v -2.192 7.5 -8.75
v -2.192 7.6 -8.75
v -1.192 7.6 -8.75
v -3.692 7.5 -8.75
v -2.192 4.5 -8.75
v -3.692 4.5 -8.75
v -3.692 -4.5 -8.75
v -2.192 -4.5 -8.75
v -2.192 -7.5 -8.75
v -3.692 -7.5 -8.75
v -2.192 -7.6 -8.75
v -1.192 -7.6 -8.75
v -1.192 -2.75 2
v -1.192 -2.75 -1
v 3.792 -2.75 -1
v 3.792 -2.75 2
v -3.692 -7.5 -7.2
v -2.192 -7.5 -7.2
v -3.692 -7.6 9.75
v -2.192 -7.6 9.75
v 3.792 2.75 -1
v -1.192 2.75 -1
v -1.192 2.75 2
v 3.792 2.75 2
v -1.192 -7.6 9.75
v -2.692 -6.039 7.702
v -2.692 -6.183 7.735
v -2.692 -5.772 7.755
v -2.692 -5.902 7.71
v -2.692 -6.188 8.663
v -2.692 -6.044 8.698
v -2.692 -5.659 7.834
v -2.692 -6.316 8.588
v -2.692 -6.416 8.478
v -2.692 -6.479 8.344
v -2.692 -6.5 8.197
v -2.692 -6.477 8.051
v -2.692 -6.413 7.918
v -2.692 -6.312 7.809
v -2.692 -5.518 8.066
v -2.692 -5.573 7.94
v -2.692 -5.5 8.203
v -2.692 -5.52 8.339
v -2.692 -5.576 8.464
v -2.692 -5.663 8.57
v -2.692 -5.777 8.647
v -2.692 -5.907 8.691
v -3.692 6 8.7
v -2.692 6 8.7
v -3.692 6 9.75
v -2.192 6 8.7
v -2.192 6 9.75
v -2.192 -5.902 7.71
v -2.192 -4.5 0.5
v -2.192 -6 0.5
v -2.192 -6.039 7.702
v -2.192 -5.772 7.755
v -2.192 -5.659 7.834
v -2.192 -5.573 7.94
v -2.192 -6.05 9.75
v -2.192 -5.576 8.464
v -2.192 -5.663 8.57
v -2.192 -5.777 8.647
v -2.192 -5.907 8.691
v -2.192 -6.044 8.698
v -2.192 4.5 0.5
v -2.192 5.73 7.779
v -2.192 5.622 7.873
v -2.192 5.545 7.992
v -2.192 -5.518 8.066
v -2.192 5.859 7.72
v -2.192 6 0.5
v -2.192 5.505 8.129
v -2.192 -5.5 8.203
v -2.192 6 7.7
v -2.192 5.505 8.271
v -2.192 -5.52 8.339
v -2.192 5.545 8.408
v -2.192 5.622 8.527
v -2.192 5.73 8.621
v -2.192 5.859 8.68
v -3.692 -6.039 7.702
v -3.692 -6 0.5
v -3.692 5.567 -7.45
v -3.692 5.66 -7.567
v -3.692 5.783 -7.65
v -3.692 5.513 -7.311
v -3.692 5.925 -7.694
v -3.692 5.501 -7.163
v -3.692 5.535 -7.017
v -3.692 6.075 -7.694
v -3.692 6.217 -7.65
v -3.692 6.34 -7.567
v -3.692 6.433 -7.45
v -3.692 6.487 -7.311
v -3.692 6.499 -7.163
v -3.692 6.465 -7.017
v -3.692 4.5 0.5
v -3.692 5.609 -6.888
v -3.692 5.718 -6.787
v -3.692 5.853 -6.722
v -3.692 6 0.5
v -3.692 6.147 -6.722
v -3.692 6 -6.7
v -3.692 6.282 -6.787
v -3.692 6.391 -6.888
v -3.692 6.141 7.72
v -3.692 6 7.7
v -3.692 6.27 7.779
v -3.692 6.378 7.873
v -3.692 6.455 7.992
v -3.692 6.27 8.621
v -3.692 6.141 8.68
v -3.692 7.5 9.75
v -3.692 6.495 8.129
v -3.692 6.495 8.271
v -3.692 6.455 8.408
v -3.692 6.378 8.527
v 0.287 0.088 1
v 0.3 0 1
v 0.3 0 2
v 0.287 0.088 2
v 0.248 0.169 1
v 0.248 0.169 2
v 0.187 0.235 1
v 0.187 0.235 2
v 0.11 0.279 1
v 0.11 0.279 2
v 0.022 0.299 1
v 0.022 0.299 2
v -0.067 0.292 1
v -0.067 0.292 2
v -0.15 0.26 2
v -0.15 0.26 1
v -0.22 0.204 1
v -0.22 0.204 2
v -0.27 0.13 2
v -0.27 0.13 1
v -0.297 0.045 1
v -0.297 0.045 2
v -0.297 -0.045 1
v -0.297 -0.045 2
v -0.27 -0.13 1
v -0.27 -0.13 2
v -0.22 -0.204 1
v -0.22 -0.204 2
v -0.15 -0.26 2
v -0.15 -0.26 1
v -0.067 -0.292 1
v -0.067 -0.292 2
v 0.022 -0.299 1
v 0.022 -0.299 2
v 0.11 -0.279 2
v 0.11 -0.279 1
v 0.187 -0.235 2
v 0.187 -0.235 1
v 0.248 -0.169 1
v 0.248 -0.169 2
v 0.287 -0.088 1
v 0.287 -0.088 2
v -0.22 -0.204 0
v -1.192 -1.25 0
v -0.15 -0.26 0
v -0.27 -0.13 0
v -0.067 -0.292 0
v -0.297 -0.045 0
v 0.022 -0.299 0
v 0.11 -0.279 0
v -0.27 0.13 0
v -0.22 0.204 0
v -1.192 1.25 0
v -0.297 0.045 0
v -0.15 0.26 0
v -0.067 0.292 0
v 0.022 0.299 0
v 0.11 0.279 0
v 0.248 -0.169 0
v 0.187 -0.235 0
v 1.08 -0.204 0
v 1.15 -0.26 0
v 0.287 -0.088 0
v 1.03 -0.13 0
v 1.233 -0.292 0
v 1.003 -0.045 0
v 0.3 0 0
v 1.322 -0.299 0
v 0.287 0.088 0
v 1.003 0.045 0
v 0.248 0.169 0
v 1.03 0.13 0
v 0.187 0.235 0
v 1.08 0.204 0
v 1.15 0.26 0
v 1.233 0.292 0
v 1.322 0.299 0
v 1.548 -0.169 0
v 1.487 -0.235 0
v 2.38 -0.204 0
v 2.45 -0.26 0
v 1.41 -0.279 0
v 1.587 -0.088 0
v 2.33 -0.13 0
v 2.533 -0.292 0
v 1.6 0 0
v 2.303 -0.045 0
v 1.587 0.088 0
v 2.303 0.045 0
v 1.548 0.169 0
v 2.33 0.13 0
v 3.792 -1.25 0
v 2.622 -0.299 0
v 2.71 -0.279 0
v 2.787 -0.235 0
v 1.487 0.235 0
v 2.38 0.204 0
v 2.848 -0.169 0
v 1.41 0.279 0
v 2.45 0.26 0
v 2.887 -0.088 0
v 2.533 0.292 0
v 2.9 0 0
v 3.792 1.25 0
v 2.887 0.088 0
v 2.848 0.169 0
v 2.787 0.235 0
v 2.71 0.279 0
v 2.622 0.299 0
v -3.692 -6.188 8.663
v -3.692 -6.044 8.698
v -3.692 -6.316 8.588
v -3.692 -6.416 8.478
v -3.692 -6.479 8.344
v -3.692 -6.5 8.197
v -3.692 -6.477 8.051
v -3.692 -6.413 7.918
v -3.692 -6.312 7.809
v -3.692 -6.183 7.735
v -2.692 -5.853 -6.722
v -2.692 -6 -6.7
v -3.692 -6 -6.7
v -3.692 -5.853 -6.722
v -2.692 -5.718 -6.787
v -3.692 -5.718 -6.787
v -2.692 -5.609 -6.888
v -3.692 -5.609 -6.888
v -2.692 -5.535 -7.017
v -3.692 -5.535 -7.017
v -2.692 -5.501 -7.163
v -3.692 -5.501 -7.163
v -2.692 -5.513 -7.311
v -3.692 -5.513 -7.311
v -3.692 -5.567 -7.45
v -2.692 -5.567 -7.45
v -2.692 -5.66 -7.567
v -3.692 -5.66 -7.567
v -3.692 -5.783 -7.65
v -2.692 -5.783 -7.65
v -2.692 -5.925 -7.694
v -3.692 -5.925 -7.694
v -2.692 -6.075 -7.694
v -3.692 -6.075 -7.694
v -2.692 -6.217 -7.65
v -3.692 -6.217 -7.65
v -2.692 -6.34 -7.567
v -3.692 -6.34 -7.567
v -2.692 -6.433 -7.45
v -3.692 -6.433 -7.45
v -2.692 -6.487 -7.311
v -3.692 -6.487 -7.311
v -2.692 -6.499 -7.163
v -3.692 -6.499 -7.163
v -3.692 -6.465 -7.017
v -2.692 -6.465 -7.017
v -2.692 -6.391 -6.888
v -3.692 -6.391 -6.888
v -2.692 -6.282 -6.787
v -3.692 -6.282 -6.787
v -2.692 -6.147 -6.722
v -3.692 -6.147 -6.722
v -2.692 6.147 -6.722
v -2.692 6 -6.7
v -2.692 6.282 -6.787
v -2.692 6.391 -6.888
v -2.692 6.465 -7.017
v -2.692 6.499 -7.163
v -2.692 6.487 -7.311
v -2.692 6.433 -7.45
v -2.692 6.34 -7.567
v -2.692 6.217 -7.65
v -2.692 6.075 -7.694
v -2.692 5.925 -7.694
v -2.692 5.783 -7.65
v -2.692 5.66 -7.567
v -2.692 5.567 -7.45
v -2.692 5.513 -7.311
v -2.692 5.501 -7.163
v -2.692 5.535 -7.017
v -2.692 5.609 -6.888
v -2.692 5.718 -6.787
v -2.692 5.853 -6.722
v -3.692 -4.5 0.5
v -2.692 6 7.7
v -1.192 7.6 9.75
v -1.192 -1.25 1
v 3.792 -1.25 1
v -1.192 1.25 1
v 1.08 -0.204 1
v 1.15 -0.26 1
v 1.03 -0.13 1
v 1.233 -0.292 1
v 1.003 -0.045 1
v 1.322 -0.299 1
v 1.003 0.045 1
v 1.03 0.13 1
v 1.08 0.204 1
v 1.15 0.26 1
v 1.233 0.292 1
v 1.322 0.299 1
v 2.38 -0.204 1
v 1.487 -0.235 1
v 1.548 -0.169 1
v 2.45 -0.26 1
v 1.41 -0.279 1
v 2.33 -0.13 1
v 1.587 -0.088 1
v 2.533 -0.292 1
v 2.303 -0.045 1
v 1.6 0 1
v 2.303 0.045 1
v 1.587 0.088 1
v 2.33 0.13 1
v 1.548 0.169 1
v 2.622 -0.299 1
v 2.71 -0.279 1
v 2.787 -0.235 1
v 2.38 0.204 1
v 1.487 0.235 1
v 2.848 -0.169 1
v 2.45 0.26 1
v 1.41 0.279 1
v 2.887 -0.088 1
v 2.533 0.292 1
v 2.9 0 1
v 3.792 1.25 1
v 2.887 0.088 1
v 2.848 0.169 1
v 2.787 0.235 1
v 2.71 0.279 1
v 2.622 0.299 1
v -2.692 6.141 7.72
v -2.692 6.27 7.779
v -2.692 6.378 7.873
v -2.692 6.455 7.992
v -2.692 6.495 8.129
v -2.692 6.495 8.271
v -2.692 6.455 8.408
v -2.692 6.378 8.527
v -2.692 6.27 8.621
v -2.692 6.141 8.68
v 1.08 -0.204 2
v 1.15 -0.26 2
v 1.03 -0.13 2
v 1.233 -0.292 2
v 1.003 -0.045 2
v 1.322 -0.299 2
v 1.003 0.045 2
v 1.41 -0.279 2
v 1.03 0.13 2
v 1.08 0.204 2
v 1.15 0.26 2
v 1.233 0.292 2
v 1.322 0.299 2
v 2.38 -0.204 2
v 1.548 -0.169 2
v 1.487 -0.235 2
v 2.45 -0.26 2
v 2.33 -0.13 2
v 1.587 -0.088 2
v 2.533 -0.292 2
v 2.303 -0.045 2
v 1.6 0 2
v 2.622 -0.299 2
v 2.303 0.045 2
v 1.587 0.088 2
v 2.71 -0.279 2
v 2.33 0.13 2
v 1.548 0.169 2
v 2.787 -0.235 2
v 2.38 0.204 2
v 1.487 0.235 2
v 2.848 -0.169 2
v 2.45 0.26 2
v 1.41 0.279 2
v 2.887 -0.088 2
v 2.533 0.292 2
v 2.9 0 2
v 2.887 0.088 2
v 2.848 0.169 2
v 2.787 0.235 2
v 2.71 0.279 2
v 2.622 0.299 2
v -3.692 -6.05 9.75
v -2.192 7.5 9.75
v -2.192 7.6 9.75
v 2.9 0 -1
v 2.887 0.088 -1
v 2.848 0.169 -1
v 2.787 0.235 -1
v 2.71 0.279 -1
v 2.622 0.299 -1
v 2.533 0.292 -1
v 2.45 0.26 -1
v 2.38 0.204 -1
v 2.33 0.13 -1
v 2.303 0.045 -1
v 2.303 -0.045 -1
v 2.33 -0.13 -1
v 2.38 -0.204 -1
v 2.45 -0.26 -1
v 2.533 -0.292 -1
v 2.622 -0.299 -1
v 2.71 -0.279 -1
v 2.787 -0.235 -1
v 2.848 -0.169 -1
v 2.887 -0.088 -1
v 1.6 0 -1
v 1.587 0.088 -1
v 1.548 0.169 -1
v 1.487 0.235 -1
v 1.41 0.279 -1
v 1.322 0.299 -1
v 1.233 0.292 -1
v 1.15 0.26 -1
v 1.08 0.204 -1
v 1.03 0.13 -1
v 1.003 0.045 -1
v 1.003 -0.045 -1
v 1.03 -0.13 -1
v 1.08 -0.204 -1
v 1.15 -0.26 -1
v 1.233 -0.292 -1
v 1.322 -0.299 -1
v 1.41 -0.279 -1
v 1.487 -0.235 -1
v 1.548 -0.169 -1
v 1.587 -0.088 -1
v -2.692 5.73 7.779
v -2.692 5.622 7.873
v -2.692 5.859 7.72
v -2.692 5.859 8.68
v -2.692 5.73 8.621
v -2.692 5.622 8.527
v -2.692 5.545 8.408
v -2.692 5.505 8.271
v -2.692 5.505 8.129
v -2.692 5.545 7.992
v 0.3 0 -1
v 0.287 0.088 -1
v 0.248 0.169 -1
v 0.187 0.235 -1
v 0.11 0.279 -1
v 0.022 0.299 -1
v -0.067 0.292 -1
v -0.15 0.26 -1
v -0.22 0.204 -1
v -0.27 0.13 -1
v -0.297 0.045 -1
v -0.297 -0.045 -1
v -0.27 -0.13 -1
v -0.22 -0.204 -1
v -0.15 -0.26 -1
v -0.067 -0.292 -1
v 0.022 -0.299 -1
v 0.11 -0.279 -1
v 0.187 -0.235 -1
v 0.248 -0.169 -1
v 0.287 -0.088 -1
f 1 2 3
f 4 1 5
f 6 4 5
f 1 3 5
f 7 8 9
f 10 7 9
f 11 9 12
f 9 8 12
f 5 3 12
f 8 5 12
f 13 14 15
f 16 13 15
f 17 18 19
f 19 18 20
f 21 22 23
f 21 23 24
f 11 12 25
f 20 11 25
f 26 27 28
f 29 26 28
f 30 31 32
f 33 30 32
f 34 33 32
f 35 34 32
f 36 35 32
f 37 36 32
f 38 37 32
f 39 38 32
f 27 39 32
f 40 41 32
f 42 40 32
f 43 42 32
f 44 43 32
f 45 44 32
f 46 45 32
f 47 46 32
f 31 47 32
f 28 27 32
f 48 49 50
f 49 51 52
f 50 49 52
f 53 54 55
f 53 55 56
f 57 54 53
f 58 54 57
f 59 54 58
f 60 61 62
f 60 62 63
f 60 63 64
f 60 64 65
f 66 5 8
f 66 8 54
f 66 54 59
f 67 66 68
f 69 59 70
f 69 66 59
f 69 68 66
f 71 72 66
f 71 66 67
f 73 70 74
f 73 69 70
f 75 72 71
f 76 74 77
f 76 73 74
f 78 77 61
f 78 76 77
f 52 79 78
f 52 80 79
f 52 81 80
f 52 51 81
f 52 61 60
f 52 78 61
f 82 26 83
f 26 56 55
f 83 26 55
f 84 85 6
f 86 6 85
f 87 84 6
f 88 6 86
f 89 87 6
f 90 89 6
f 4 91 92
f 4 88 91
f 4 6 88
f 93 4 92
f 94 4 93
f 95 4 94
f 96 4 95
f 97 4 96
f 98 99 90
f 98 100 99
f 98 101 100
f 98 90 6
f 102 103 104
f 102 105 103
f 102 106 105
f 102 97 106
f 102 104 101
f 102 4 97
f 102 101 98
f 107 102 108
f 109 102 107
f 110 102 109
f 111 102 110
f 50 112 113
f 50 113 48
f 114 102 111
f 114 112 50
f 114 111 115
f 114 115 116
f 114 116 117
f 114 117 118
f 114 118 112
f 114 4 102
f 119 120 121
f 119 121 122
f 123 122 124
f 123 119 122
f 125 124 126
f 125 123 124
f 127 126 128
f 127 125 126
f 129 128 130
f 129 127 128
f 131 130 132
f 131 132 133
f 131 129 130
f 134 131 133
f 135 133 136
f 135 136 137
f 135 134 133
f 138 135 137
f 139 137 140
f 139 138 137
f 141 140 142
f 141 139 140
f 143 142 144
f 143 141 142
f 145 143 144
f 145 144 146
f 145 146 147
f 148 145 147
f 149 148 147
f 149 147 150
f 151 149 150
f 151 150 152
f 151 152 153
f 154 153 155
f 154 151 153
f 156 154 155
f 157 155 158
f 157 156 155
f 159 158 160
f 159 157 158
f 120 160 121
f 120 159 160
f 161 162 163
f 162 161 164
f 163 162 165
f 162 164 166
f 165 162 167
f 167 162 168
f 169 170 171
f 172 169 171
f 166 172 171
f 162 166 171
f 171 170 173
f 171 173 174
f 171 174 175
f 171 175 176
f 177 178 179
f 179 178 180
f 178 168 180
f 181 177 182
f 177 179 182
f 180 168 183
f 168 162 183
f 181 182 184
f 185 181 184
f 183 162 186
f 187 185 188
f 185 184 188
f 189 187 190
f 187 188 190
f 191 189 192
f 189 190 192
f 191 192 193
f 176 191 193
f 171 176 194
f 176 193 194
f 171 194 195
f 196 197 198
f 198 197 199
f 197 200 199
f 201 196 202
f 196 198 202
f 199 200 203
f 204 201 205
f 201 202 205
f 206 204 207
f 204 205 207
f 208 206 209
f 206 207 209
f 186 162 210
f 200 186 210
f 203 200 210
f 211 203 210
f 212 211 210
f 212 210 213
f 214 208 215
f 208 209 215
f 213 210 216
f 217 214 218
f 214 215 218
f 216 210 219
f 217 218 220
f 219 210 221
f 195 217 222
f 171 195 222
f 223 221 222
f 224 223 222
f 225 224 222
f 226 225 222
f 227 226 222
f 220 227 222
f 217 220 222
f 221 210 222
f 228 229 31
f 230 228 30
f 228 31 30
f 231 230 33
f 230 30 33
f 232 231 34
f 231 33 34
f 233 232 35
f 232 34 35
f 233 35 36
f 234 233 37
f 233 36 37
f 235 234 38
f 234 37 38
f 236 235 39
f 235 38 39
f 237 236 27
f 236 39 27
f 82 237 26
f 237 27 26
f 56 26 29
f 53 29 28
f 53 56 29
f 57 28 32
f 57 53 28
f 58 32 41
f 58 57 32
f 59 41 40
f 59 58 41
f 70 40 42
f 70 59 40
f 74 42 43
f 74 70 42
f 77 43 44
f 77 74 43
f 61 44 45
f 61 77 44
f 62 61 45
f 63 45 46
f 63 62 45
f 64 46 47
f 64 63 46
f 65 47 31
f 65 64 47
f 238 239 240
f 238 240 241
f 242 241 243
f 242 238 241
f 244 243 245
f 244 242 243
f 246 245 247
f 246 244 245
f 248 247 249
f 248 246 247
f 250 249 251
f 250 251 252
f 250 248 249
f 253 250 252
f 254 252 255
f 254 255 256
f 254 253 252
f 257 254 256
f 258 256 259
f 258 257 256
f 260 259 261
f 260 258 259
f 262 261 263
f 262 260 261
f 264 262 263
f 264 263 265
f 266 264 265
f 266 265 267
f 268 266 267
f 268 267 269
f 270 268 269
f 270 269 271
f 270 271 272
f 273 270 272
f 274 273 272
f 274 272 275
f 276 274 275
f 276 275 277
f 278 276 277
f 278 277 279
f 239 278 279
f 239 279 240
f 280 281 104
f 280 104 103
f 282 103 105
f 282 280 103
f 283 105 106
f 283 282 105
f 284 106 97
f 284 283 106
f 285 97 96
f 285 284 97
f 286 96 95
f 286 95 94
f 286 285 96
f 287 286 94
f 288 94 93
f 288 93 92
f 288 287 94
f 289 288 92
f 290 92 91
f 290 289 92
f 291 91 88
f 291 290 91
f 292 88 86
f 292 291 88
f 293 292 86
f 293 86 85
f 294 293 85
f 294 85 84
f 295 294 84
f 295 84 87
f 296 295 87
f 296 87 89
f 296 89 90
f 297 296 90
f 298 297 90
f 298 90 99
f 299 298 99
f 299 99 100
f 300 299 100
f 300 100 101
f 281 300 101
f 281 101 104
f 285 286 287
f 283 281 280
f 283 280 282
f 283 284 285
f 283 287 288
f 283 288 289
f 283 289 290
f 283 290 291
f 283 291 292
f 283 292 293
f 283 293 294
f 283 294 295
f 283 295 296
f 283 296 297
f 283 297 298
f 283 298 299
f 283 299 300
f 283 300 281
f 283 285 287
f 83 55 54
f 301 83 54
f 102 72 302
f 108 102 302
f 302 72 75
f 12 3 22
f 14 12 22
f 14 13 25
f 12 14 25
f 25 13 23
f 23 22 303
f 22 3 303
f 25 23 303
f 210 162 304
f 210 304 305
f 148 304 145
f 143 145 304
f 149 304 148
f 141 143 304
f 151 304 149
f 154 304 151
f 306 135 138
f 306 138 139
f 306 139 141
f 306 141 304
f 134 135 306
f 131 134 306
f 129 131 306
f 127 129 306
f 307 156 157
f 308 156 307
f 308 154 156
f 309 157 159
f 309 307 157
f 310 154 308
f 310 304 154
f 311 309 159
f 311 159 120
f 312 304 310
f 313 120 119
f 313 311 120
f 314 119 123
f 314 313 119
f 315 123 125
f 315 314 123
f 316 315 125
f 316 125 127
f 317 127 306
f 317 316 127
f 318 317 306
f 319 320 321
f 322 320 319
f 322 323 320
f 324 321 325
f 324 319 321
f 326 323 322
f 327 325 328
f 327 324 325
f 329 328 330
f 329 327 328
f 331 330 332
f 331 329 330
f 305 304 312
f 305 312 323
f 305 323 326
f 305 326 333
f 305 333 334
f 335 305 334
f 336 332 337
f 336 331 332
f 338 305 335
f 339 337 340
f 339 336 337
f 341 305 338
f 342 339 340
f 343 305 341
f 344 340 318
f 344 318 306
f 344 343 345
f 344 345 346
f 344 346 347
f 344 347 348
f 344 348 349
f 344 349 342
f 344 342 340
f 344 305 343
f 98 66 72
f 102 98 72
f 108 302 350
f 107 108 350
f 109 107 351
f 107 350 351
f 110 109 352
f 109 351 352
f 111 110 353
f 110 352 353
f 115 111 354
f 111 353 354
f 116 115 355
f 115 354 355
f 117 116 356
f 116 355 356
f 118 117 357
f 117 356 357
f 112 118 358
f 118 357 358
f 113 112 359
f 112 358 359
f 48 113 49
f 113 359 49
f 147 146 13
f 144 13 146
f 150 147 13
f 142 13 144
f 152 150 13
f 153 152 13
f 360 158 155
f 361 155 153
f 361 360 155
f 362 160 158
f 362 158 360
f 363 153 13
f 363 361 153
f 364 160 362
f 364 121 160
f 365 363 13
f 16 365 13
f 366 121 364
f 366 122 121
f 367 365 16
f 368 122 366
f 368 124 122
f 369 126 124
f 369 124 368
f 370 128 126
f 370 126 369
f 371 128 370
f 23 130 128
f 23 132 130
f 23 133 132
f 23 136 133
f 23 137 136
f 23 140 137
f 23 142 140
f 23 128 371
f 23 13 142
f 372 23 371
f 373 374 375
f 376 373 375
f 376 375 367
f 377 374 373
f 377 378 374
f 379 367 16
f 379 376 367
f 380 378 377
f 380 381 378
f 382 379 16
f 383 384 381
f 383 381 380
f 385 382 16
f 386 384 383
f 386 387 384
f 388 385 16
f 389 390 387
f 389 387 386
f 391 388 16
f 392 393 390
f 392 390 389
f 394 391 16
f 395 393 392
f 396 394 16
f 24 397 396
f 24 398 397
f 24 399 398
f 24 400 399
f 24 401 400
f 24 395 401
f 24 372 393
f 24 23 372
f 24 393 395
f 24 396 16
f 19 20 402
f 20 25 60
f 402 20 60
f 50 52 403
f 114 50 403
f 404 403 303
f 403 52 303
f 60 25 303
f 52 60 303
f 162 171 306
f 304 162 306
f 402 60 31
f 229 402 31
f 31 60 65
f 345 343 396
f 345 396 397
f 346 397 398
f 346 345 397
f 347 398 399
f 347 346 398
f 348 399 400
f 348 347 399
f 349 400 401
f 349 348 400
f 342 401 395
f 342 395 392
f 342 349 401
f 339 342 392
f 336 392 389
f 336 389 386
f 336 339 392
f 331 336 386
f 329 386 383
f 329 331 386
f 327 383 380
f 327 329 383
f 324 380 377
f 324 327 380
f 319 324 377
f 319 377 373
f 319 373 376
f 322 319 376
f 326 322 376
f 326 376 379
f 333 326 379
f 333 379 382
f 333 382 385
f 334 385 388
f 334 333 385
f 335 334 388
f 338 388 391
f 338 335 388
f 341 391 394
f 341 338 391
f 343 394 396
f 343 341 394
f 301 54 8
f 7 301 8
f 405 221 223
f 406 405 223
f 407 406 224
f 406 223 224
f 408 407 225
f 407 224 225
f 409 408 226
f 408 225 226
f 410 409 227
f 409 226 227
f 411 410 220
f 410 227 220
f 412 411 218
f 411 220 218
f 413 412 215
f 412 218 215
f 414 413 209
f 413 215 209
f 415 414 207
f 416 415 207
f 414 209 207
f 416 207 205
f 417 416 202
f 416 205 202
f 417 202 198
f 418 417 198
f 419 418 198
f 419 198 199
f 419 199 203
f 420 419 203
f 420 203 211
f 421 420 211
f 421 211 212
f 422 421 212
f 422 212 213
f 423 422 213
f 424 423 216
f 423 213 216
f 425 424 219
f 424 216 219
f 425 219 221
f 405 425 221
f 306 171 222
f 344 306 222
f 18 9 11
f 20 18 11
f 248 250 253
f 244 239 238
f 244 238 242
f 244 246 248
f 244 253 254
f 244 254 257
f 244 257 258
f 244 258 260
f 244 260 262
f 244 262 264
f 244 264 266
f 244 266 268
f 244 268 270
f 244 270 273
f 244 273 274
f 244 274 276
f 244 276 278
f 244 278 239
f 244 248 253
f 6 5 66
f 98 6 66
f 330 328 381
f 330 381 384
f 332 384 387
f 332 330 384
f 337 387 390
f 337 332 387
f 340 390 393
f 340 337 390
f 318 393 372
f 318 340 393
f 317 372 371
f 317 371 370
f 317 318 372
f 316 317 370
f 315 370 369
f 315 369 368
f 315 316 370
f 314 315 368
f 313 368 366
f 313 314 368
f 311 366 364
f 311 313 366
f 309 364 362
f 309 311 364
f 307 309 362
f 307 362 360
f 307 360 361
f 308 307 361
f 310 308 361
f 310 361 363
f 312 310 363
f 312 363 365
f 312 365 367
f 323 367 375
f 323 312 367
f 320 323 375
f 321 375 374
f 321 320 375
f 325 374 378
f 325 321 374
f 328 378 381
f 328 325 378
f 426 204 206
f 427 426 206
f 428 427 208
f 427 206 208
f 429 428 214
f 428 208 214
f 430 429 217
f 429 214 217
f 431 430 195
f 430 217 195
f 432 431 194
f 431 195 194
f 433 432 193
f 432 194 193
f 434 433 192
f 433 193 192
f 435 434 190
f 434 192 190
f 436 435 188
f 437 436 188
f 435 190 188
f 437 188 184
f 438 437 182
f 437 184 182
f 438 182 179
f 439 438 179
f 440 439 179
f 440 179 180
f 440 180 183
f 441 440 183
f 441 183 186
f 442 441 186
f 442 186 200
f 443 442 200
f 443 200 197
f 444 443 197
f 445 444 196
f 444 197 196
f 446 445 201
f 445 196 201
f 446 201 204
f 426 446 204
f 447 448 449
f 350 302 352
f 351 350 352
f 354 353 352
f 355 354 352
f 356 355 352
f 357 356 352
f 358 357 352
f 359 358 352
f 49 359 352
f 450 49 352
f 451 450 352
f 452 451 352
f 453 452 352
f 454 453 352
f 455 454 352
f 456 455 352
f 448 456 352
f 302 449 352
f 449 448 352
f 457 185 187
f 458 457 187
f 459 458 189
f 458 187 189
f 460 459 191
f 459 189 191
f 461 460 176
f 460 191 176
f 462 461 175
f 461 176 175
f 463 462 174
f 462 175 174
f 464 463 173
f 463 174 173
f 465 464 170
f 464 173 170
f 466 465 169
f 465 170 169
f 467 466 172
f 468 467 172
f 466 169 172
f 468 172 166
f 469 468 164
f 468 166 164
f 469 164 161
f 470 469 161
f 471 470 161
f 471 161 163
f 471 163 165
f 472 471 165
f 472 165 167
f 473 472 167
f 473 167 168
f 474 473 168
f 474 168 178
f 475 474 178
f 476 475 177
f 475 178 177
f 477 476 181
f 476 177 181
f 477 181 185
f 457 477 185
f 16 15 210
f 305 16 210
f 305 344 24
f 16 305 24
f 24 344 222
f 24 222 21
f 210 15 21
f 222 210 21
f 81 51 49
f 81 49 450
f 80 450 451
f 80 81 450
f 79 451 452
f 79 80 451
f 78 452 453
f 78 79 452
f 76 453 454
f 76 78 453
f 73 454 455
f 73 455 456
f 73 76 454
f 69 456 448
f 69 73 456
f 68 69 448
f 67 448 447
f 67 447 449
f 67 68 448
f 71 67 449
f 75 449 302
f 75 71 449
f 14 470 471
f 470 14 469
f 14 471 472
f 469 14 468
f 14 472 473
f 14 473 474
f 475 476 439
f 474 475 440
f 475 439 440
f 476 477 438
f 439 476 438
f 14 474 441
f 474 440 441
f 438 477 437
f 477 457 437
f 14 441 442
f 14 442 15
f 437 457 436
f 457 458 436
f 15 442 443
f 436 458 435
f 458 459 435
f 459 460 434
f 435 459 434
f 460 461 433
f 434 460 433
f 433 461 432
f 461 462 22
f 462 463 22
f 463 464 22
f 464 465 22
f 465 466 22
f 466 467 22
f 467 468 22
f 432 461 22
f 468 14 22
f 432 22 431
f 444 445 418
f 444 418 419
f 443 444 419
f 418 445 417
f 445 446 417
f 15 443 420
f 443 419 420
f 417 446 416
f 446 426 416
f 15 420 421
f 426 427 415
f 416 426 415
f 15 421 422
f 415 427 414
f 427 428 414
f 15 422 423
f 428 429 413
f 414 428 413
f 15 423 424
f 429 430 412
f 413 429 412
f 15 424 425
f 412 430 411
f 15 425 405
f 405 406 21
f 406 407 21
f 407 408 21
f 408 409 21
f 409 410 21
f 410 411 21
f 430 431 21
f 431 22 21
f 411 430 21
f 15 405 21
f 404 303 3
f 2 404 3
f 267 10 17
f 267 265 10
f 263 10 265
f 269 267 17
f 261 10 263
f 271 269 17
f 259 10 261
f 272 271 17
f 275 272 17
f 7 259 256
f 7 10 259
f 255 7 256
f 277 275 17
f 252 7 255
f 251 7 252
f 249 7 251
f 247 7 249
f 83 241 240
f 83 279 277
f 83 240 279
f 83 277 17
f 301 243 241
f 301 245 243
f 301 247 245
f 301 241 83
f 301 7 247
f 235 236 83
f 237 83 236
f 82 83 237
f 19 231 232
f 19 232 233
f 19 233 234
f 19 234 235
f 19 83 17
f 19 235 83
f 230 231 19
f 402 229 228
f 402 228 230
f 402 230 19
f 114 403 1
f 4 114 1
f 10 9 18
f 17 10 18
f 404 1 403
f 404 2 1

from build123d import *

# Parameters (mm, degrees)
SKETCH1_W                = 4.983520766
SKETCH1_H                = 2.5
SKETCH1_R                = 0.3
BOSS_EXTRUDE1_DEPTH      = 1
SKETCH4_W                = 8.75
SKETCH4_H                = 15.2
BOSS_EXTRUDE2_DEPTH      = 1
SKETCH4_3_R              = 0.5
BOSS_EXTRUDE3_DEPTH      = 1.5
BOSS_EXTRUDE4_DEPTH      = 1
BOSS_EXTRUDE4_DEPTH_BACK = 1
BOSS_EXTRUDE5_DEPTH      = 1.5
BOSS_EXTRUDE5_DEPTH_BACK = 1.5
SKETCH5_4_W              = 4.983520766
SKETCH5_4_H              = 1.5
SKETCH7_R                = 0.5
BOSS_EXTRUDE6_DEPTH      = 1.5


with BuildPart() as part:
    # Sketch1 → Boss-Extrude1 (new body)
    with BuildSketch(Plane.XY):
        with Locations((1.3, 0)):
            Rectangle(SKETCH1_W, SKETCH1_H)
        Circle(SKETCH1_R, mode=Mode.SUBTRACT)
        with Locations((1.3, 0)):
            Circle(SKETCH1_R, mode=Mode.SUBTRACT)
        with Locations((2.6, 0)):
            Circle(SKETCH1_R, mode=Mode.SUBTRACT)
    extrude(amount=-BOSS_EXTRUDE1_DEPTH)

    # Sketch4 → Boss-Extrude2 (add)
    with BuildSketch(Plane.ZY.offset(1.191760383)):
        with Locations((-4.375, 0)):
            Rectangle(SKETCH4_W, SKETCH4_H)
    extrude(amount=BOSS_EXTRUDE2_DEPTH)

    # Sketch4<3> → Boss-Extrude3 (add)
    with BuildSketch(Plane.ZY.offset(1.191760383)):
        with Locations((-7.2, -6)):
            Circle(SKETCH4_3_R)
        with Locations((-7.2, 6)):
            Circle(SKETCH4_3_R)
    extrude(amount=BOSS_EXTRUDE3_DEPTH)


with BuildPart() as body_2:
    # Mirror3: mirrored copy
    add(part.part.mirror(Plane.XY.offset(0.5)))


with BuildPart() as part_1:
    add(part.part)

    add(body_2.part)  # Boss-Extrude4 merges body 2
    # Sketch5 → Boss-Extrude4 (add, two sides: drawn at the far end of the back side and taken through both)
    with BuildSketch(Plane.XY.offset(0.5).offset(-BOSS_EXTRUDE4_DEPTH_BACK)):
        Polygon((-1.191760383, -7.6), (-1.191760383, -2.75), (-1.191760383, -1.25), (-1.191760383, 1.25), (-1.191760383, 2.75), (-1.191760383, 7.6), (-2.191760383, 7.6), (-2.191760383, -7.6), align=None)
    extrude(amount=BOSS_EXTRUDE4_DEPTH + BOSS_EXTRUDE4_DEPTH_BACK)

    # Sketch5<4> → Boss-Extrude5 (add, two sides: drawn at the far end of the back side and taken through both)
    with BuildSketch(Plane.XY.offset(0.5).offset(-BOSS_EXTRUDE5_DEPTH_BACK)):
        with Locations((1.3, -2)):
            Rectangle(SKETCH5_4_W, SKETCH5_4_H)
        with Locations((1.3, 2)):
            Rectangle(SKETCH5_4_W, SKETCH5_4_H)
    extrude(amount=BOSS_EXTRUDE5_DEPTH + BOSS_EXTRUDE5_DEPTH_BACK)

    # Sketch7 → Boss-Extrude6 (add)
    # profile 1 of 2: a face of its own
    with BuildSketch(Plane.ZY.offset(2.191760383)):
        with BuildLine():
            Line((-8.75, -7.5), (-7.2, -7.5))
            Line((-7.2, -7.5), (9.75, -7.6))
            Line((9.75, -7.6), (9.75, -6.05))
            Line((9.75, -6.05), (8.698032426, -6.044313689))
            ThreePointArc((8.698032426, -6.044313689), (8.197297337, -6.499992696), (7.701517624, -6.038927122))
            Line((7.701517624, -6.038927122), (0.5, -6))
            Line((0.5, -6), (0.5, -4.5))
            Line((0.5, -4.5), (-8.75, -4.5))
            Line((-8.75, -4.5), (-8.75, -7.5))
        make_face()
        with Locations((-7.2, -6)):
            Circle(SKETCH7_R, mode=Mode.SUBTRACT)
    # profile 2 of 2: a face of its own
    with BuildSketch(Plane.ZY.offset(2.191760383)):
        with BuildLine():
            Line((-8.75, 7.5), (-8.75, 4.5))
            Line((-8.75, 4.5), (0.5, 4.5))
            Line((0.5, 4.5), (0.5, 6))
            Line((0.5, 6), (7.7, 6))
            ThreePointArc((7.7, 6), (8.2, 6.5), (8.7, 6))
            Line((8.7, 6), (9.75, 6))
            Line((9.75, 6), (9.75, 7.5))
            Line((9.75, 7.5), (-8.75, 7.5))
        make_face()
        with Locations((-7.2, 6)):
            Circle(SKETCH7_R, mode=Mode.SUBTRACT)
    extrude(amount=BOSS_EXTRUDE6_DEPTH)


solid = part_1.part
